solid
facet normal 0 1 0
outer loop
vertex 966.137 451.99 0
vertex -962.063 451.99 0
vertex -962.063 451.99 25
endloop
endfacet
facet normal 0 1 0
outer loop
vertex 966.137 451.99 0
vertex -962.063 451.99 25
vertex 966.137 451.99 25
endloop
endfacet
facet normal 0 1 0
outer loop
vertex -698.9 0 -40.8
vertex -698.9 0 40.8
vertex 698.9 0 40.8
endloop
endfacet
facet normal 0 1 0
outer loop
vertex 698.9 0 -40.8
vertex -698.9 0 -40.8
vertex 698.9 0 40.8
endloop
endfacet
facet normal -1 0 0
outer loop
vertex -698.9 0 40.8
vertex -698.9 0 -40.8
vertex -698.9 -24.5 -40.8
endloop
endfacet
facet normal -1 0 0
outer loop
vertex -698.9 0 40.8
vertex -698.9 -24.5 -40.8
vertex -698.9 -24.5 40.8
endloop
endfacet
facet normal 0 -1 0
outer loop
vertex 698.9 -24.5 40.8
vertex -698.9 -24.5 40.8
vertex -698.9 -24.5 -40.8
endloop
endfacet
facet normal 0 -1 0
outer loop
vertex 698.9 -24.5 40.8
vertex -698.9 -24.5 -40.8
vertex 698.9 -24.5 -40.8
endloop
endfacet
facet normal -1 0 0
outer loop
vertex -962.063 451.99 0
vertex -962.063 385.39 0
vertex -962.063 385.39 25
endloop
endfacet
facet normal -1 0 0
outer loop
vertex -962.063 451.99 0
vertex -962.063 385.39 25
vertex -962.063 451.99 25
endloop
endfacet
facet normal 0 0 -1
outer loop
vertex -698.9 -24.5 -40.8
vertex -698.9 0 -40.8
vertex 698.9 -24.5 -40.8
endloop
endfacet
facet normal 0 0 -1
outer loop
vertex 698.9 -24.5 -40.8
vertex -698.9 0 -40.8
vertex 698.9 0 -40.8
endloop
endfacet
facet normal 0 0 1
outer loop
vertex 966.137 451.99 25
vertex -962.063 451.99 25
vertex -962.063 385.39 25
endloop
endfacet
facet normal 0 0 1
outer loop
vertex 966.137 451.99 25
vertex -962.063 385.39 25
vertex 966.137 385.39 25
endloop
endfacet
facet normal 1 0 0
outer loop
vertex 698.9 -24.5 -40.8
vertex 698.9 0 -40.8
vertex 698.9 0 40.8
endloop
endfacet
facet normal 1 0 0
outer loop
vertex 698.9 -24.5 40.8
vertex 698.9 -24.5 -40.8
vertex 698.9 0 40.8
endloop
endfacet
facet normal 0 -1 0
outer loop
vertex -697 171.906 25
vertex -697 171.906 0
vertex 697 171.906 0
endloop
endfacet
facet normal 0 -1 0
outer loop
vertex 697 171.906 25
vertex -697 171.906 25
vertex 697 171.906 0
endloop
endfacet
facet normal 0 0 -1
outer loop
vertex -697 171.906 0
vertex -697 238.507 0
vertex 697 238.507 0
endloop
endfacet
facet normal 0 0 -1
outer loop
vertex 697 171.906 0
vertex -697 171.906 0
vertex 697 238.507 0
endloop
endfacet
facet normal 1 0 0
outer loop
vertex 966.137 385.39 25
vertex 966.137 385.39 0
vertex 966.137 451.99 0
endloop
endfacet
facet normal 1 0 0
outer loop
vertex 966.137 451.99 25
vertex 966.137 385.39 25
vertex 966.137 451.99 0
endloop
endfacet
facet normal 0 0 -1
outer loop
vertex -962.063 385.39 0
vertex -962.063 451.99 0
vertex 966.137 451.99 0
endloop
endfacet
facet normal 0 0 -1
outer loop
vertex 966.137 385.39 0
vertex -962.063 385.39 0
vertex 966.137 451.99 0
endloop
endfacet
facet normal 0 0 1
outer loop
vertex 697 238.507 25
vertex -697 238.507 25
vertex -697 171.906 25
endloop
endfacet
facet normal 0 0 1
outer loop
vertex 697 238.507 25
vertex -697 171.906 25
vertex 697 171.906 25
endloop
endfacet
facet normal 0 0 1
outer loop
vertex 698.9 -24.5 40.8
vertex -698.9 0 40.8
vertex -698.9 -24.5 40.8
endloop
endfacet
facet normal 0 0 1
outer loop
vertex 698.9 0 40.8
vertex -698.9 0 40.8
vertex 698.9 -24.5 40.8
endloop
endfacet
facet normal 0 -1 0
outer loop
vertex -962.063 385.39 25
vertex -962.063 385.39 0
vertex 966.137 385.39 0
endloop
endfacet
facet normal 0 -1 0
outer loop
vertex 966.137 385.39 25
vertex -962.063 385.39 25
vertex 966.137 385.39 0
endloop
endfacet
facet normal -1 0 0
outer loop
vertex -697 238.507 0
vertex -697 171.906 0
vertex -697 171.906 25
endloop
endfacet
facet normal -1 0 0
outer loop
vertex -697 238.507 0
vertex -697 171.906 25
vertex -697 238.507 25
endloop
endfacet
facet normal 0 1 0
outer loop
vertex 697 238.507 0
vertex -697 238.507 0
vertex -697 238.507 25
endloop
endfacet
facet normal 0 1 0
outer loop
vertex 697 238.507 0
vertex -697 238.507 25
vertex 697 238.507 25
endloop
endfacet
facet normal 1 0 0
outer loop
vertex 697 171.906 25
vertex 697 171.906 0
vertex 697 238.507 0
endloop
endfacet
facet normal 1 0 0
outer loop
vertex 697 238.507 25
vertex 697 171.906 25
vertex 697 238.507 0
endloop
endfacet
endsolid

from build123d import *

# Parameters (mm, degrees)
F0_W     = 1397.8
F0_H     = 81.6
F1_DEPTH = 24.5
F2_W     = 1394
F2_H     = 66.6
F3_DEPTH = 25
F4_W     = 1928.2
F4_H     = 66.6
F5_DEPTH = 25


with BuildPart() as f1:
    # F0 (on Front) → F1 (new body)
    with BuildSketch(Plane.XZ):
        Rectangle(F0_W, F0_H)
    extrude(amount=F1_DEPTH)


with BuildPart() as f3:
    # F2 (on Top) → F3 (new body)
    with BuildSketch(Plane.XY):
        with Locations((0, 205.2065)):
            Rectangle(F2_W, F2_H)
    extrude(amount=F3_DEPTH)


with BuildPart() as f5:
    # F4 (on Top) → F5 (new body)
    with BuildSketch(Plane.XY):
        with Locations((2.036833, 418.690205)):
            Rectangle(F4_W, F4_H)
    extrude(amount=F5_DEPTH)


solid = Compound([f1.part, f3.part, f5.part])
